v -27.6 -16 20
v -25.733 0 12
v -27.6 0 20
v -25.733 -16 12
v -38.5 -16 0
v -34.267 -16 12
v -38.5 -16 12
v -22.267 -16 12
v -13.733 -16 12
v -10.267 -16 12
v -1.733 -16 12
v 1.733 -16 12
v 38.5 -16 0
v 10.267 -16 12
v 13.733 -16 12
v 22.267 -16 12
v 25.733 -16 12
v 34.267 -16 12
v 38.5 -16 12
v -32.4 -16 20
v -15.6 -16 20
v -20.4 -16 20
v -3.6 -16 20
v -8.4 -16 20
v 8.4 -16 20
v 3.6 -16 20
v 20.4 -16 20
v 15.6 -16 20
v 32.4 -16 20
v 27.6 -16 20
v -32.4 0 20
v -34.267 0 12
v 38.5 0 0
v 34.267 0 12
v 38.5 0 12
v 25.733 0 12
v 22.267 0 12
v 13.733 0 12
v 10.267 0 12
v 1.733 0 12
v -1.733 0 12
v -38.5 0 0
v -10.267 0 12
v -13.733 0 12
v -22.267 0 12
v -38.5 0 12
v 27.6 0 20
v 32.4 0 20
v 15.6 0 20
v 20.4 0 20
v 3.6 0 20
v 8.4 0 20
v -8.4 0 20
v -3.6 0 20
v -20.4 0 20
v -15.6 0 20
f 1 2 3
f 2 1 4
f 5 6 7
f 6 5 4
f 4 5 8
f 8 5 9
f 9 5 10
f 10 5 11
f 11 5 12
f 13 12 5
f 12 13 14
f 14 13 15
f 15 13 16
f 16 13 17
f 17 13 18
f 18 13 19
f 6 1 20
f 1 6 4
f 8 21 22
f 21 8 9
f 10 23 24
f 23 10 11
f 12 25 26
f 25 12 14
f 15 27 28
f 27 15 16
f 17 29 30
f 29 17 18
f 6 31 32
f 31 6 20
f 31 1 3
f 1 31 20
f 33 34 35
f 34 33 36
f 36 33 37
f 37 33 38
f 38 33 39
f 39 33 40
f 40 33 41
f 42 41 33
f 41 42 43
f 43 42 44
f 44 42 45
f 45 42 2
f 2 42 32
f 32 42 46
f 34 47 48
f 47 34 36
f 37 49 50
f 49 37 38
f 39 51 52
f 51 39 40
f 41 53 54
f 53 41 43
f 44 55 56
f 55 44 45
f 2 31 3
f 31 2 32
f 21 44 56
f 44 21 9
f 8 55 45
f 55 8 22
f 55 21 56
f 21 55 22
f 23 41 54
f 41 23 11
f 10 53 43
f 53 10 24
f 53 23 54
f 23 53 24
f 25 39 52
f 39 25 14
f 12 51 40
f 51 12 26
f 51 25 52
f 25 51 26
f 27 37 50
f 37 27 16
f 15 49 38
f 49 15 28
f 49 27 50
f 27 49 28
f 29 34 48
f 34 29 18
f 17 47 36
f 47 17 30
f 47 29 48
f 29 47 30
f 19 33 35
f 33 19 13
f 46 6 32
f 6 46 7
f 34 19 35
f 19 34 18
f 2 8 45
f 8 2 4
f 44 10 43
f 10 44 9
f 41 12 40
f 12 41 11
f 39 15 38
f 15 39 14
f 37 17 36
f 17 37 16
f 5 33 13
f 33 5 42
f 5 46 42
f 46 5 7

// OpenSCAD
$fn = 32;

// ----------------------------------------------------------------------
// Toothed rack, 6 teeth
// 12 mm pitch, 8 mm teeth
// ----------------------------------------------------------------------

// --- parameters (mm) ---
bar_w = 16;     // bar width (Y)
bar_h = 12;     // bar height (Z)
teeth = 6;      // number of teeth
pitch = 12;     // tooth pitch
tooth_h = 8;    // tooth height above the bar
root_w = 9;     // tooth width at the root
crest_w = 4.8;  // tooth width at the crest

// --- derived feature positions (mm) ---
span = (teeth - 1) * pitch;  // = 60   distance between the outer teeth
bar_l = span + root_w + 8;   // = 77   bar length: teeth plus 4 mm at each end
tooth_x = -span / 2;         // = -30   X of the first tooth
height = bar_h + tooth_h;    // = 20   overall height
feature_centers = [
  [tooth_x + 0 * pitch, -bar_w / 2],
  [tooth_x + 1 * pitch, -bar_w / 2],
  [tooth_x + 2 * pitch, -bar_w / 2],
  [tooth_x + 3 * pitch, -bar_w / 2],
  [tooth_x + 4 * pitch, -bar_w / 2],
  [tooth_x + 5 * pitch, -bar_w / 2]
];   // tooth centre line, drives the tooth loop

// bar with a rack of teeth, one extruded trapezoium per centre
module rack_tooth() {
  linear_extrude(height = bar_w)
    polygon(points = [
      [0, 0],
      [root_w, 0],
      [root_w / 2 + crest_w / 2, tooth_h + 1],
      [root_w / 2 - crest_w / 2, tooth_h + 1]
    ]);
}

union() {
  translate([-bar_l / 2, -bar_w, 0]) cube([bar_l, bar_w, bar_h]);
  for (centre = feature_centers)
    translate([centre[0] - root_w / 2, 0, bar_h - 1]) rotate([90, 0, 0]) rack_tooth();
}
